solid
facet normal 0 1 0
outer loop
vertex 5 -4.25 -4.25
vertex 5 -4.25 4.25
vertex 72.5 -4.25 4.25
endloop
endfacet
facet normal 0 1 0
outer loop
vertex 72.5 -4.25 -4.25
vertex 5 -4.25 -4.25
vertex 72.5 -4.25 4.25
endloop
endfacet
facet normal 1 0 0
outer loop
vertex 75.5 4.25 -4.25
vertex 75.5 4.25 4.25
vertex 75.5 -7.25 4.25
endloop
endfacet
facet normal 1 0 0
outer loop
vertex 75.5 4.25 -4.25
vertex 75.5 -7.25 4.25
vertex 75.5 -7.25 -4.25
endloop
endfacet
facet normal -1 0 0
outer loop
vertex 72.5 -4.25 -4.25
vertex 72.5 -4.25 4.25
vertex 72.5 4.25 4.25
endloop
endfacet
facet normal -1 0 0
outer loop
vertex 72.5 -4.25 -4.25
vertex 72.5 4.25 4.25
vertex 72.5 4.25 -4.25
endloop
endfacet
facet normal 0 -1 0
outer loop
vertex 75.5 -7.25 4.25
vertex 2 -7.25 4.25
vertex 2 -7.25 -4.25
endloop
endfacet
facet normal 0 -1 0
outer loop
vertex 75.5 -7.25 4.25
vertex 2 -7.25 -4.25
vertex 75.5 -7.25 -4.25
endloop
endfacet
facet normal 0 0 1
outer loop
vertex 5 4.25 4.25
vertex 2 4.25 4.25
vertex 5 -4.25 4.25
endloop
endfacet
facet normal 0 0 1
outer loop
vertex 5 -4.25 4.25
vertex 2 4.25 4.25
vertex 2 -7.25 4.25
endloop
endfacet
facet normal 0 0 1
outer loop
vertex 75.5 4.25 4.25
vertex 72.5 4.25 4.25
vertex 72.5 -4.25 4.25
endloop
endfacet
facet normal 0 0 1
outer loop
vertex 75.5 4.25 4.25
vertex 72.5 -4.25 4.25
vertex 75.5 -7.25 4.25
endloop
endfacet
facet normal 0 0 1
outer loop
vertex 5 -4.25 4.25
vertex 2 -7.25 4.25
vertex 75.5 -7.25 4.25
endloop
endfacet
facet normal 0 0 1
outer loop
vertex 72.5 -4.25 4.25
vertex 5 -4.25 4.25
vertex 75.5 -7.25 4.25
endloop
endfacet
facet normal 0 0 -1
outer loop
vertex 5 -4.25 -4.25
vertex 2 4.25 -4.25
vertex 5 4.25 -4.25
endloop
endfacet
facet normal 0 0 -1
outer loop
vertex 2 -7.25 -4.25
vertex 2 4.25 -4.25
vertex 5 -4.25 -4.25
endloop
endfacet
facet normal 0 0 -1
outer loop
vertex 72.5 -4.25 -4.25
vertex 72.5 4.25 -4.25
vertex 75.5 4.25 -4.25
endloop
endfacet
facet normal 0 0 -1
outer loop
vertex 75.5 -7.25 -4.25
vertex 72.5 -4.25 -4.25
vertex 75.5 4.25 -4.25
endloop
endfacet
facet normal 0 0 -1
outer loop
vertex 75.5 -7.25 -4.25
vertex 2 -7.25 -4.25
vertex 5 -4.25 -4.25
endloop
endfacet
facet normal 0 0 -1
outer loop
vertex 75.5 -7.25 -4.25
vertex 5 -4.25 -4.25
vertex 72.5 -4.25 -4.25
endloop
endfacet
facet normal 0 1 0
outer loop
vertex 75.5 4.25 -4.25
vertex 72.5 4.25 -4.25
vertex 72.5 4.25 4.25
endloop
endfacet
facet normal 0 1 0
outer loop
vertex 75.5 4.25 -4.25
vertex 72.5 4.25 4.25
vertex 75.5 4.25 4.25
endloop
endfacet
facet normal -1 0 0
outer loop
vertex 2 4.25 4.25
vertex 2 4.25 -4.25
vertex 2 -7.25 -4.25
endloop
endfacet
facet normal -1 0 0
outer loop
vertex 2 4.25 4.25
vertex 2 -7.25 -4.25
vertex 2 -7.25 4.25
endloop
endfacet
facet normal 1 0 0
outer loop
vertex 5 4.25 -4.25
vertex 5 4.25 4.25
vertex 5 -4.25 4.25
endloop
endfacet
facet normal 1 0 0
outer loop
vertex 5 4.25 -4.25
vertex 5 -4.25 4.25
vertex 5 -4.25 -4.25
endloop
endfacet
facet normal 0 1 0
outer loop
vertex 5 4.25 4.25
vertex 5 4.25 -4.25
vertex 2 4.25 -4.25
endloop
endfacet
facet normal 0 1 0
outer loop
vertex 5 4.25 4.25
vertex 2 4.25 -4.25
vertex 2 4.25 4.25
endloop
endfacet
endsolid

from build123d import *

# Parameters (mm, degrees)
SKETCH1_W            = 8.5
SKETCH1_H            = 8.5
BOSS_EXTRUDE1_DEPTH  = 5
SKETCH2_W            = 8.5
SKETCH2_H            = 8.5
BOSS_EXTRUDE2_DEPTH  = 2
SKETCH3_R            = 1.5
CUT_EXTRUDE1_DEPTH   = 2
SKETCH4_W            = 81.5
SKETCH4_H            = 8.5
BOSS_EXTRUDE3_DEPTH  = 3
SKETCH5_W            = 7
SKETCH5_H            = 8.5
BOSS_EXTRUDE4_DEPTH  = 8.5
CUT_EXTRUDE2_DEPTH   = 5
SKETCH7_R            = 1.5
CUT_EXTRUDE3_DEPTH   = 5
CUT_EXTRUDE4_DEPTH   = 10
SKETCH9_W            = 8.5
SKETCH9_H            = 8.5
SKETCH9_R            = 1.5
BOSS_EXTRUDE5_DEPTH  = 2
CUT_EXTRUDE5_DEPTH   = 2
SKETCH11_W           = 8.5
SKETCH11_H           = 8.5
SKETCH11_R           = 1.5
BOSS_EXTRUDE6_DEPTH  = 2
BOSS_EXTRUDE7_DEPTH  = 5
BOSS_EXTRUDE8_DEPTH  = 5
SKETCH14_W           = 8.5
SKETCH14_H           = 11.5
CUT_EXTRUDE6_DEPTH   = 4
SKETCH15_W           = 8.5
SKETCH15_H           = 11.5
CUT_EXTRUDE7_DEPTH   = 4
SKETCH16_R           = 1.5
CUT_EXTRUDE8_DEPTH   = 4
SKETCH17_R           = 1.5
CUT_EXTRUDE9_DEPTH   = 4
SKETCH19_W           = 8.5
SKETCH19_H           = 8.5
BOSS_EXTRUDE9_DEPTH  = 3
SKETCH20_W           = 8.5
SKETCH20_H           = 8.5
BOSS_EXTRUDE10_DEPTH = 3


with BuildPart() as part:
    # Sketch1 → Boss-Extrude1 (new body)
    with BuildSketch(Plane(origin=(0, 0, 0), x_dir=(0, 0, -1), z_dir=(1, 0, 0))):
        Rectangle(SKETCH1_W, SKETCH1_H)
        Polygon((1.58771324, 2.75), (-1.58771324, 2.75), (-3.175426481, 0), (-1.58771324, -2.75), (1.58771324, -2.75), (3.175426481, 0), align=None, mode=Mode.SUBTRACT)
    extrude(amount=BOSS_EXTRUDE1_DEPTH)

    # Sketch2 → Boss-Extrude2 (add)
    with BuildSketch(Plane.ZY):
        Rectangle(SKETCH2_W, SKETCH2_H)
    extrude(amount=BOSS_EXTRUDE2_DEPTH)

    # Sketch3 → Cut-Extrude1 (cut)
    with BuildSketch(Plane(origin=(0, 0, 0), x_dir=(0, 0, -1), z_dir=(1, 0, 0))):
        Circle(SKETCH3_R)
    extrude(amount=-CUT_EXTRUDE1_DEPTH, mode=Mode.SUBTRACT)

    # Sketch4 → Boss-Extrude3 (add)
    with BuildSketch(Plane.XZ.offset(4.25)):
        with Locations((38.75, 0)):
            Rectangle(SKETCH4_W, SKETCH4_H)
    extrude(amount=BOSS_EXTRUDE3_DEPTH)

    # Sketch5 → Boss-Extrude4 (add)
    with BuildSketch(Plane(origin=(0, -4.25, 0), x_dir=(1, 0, 0), z_dir=(0, 1, 0))):
        with Locations((76, 0)):
            Rectangle(SKETCH5_W, SKETCH5_H)
    extrude(amount=BOSS_EXTRUDE4_DEPTH)

    # Sketch6 → Cut-Extrude2 (cut)
    with BuildSketch(Plane.ZY.offset(-72.5)):
        Polygon((3.175426481, 0), (1.58771324, 2.75), (-1.58771324, 2.75), (-3.175426481, 0), (-1.58771324, -2.75), (1.58771324, -2.75), align=None)
    extrude(amount=-CUT_EXTRUDE2_DEPTH, mode=Mode.SUBTRACT)

    # Sketch7 → Cut-Extrude3 (cut)
    with BuildSketch(Plane.ZY.offset(-77.5)):
        Circle(SKETCH7_R)
    extrude(amount=-CUT_EXTRUDE3_DEPTH, mode=Mode.SUBTRACT)

    # Sketch8 → Cut-Extrude4 (cut)
    with BuildSketch(Plane.ZY.offset(2)):
        Polygon((-1.58771324, 2.75), (1.58771324, 2.75), (3.175426481, 0), (1.58771324, -2.75), (-1.58771324, -2.75), (-3.175426481, 0), align=None)
    extrude(amount=-CUT_EXTRUDE4_DEPTH, mode=Mode.SUBTRACT)

    # Sketch9 → Boss-Extrude5 (add)
    with BuildSketch(Plane(origin=(5, 0, 0), x_dir=(0, 0, -1), z_dir=(1, 0, 0))):
        Rectangle(SKETCH9_W, SKETCH9_H)
        Circle(SKETCH9_R, mode=Mode.SUBTRACT)
    extrude(amount=-BOSS_EXTRUDE5_DEPTH)

    # Sketch10 → Cut-Extrude5 (cut)
    with BuildSketch(Plane(origin=(79.5, 0, 0), x_dir=(0, 0, -1), z_dir=(1, 0, 0))):
        Polygon((-3.175426481, 0), (-1.58771324, 2.75), (1.58771324, 2.75), (3.175426481, 0), (1.58771324, -2.75), (-1.58771324, -2.75), align=None)
    extrude(amount=-CUT_EXTRUDE5_DEPTH, mode=Mode.SUBTRACT)

    # Sketch11 → Boss-Extrude6 (add)
    with BuildSketch(Plane.ZY.offset(-72.5)):
        Rectangle(SKETCH11_W, SKETCH11_H)
        Circle(SKETCH11_R, mode=Mode.SUBTRACT)
    extrude(amount=-BOSS_EXTRUDE6_DEPTH)

    # Sketch12 → Boss-Extrude7 (add)
    with BuildSketch(Plane.ZY.offset(-3)):
        Polygon((-3.175426481, 0), (-1.58771324, 2.75), (1.58771324, 2.75), (3.175426481, 0), (1.58771324, -2.75), (-1.58771324, -2.75), align=None)
    extrude(amount=BOSS_EXTRUDE7_DEPTH)

    # Sketch13 → Boss-Extrude8 (add)
    with BuildSketch(Plane(origin=(74.5, 0, 0), x_dir=(0, 0, -1), z_dir=(1, 0, 0))):
        Polygon((-1.58771324, 2.75), (-3.175426481, 0), (-1.58771324, -2.75), (1.58771324, -2.75), (3.175426481, 0), (1.58771324, 2.75), align=None)
    extrude(amount=BOSS_EXTRUDE8_DEPTH)

    # Sketch14 → Cut-Extrude6 (cut)
    with BuildSketch(Plane.ZY.offset(2)):
        with Locations((0, -1.5)):
            Rectangle(SKETCH14_W, SKETCH14_H)
    extrude(amount=-CUT_EXTRUDE6_DEPTH, mode=Mode.SUBTRACT)

    # Sketch15 → Cut-Extrude7 (cut)
    with BuildSketch(Plane(origin=(79.5, 0, 0), x_dir=(0, 0, -1), z_dir=(1, 0, 0))):
        with Locations((0, -1.5)):
            Rectangle(SKETCH15_W, SKETCH15_H)
    extrude(amount=-CUT_EXTRUDE7_DEPTH, mode=Mode.SUBTRACT)

    # Sketch16 → Cut-Extrude8 (cut)
    with BuildSketch(Plane(origin=(5, 0, 0), x_dir=(0, 0, -1), z_dir=(1, 0, 0))):
        Circle(SKETCH16_R)
    extrude(amount=-CUT_EXTRUDE8_DEPTH, mode=Mode.SUBTRACT)

    # Sketch17 → Cut-Extrude9 (cut)
    with BuildSketch(Plane.ZY.offset(-74.5)):
        Circle(SKETCH17_R)
    extrude(amount=-CUT_EXTRUDE9_DEPTH, mode=Mode.SUBTRACT)

    # Sketch19 → Boss-Extrude9 (add)
    with BuildSketch(Plane(origin=(5, 0, 0), x_dir=(0, 0, -1), z_dir=(1, 0, 0))):
        Rectangle(SKETCH19_W, SKETCH19_H)
    extrude(amount=-BOSS_EXTRUDE9_DEPTH)

    # Sketch20 → Boss-Extrude10 (add)
    with BuildSketch(Plane.ZY.offset(-72.5)):
        Rectangle(SKETCH20_W, SKETCH20_H)
    extrude(amount=-BOSS_EXTRUDE10_DEPTH)


solid = part.part
